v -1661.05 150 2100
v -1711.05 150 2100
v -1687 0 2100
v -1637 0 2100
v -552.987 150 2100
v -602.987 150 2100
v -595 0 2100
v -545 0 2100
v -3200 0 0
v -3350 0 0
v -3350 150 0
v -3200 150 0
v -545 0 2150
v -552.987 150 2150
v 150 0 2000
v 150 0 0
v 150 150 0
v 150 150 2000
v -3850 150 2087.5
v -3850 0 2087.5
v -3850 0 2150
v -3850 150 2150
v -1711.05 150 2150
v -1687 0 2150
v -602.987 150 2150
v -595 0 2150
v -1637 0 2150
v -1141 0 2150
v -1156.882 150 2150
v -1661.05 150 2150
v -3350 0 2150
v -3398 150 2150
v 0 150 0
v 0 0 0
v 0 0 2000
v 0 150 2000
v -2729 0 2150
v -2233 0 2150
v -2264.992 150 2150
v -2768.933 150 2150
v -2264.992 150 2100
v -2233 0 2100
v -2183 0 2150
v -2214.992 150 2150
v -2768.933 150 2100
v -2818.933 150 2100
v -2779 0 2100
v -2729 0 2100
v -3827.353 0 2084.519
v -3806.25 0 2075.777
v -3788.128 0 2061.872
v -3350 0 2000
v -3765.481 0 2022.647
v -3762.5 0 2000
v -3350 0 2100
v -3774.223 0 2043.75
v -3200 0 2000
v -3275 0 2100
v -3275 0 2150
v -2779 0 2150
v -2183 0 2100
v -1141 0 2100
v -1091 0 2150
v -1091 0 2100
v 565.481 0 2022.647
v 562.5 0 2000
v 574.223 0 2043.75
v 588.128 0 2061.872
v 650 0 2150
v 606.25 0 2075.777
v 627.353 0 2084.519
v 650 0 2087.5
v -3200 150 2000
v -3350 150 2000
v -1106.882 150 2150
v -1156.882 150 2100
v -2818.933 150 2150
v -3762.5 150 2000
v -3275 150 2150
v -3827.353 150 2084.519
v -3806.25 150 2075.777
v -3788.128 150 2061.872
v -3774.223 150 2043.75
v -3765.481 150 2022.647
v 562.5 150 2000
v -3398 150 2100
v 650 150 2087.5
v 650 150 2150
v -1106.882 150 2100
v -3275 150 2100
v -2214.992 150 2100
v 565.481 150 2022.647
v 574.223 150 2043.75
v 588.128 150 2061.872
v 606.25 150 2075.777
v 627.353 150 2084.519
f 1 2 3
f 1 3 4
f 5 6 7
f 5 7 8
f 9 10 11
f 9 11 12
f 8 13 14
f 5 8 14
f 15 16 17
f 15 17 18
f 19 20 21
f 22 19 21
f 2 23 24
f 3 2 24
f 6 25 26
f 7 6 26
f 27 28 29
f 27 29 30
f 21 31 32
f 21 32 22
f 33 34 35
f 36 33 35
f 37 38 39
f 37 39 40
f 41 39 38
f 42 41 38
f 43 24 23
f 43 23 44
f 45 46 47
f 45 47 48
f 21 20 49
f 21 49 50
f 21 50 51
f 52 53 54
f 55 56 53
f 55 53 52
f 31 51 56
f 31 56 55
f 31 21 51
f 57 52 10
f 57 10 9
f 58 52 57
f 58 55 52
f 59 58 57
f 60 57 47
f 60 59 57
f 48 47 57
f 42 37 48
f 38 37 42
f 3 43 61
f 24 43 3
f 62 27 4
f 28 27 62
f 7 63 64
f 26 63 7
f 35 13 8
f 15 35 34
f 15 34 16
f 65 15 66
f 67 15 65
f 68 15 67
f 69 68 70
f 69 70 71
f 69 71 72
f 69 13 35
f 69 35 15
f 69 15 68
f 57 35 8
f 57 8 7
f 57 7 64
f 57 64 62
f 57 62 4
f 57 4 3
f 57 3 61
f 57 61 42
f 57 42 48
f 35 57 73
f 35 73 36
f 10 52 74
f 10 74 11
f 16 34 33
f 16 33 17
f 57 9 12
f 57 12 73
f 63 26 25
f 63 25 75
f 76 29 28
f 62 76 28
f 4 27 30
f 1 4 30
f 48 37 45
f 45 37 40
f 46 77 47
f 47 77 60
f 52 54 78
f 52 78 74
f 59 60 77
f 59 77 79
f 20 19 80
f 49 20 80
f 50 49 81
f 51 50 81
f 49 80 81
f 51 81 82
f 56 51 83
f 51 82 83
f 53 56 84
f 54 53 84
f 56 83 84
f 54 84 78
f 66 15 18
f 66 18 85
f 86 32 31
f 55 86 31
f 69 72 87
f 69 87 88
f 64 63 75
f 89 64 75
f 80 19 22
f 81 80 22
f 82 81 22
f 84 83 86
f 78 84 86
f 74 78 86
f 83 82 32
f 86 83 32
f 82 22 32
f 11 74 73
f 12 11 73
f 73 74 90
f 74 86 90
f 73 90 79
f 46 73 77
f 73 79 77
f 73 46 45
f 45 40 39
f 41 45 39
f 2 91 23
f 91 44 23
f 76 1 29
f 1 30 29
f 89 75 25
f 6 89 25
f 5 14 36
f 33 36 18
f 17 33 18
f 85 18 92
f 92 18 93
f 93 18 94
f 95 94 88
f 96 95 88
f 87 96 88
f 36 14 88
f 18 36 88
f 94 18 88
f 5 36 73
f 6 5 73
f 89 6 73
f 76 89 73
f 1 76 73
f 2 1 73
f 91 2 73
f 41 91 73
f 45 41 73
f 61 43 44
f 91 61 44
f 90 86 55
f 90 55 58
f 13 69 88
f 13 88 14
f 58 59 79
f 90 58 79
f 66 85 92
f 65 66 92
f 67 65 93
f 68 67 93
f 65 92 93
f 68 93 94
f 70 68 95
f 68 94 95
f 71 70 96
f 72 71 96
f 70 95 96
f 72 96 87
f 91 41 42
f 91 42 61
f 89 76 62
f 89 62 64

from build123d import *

# Parameters (mm, degrees)
F0_W     = 150
F0_H     = 2000
F0_W_2   = 500
F0_H_2   = 150
F1_DEPTH = 150
F2_D     = 175
F3_D     = 175
F4_W     = 75
F4_H     = 150
F5_DEPTH = 50
F6_DEPTH = 50
F7_DEPTH = 50


with BuildPart() as f1:
    # F0 (on Front) → F1 (new body)
    with BuildSketch(Plane.XZ):
        with Locations((75, 1000)):
            Rectangle(F0_W, F0_H)
        Polygon((-3200, 2000), (0, 2000), (150, 2000), (150, 2150), (-3350, 2150), (-3350, 2000), align=None)
        with Locations((400, 2075)):
            Rectangle(F0_W_2, F0_H_2)
        with Locations((-3275, 1000)):
            Rectangle(F0_W, F0_H)
        with Locations((-3600, 2075)):
            Rectangle(F0_W_2, F0_H_2)
    extrude(amount=-F1_DEPTH)

    # F2 (through all)
    with Locations(Plane.XZ):
        with Locations((-3850, 2000)):
            Hole(F2_D / 2)

    # F3 (through all)
    with Locations(Plane.XZ):
        with Locations((650, 2000)):
            Hole(F3_D / 2)

    # F4 (on face) → F5 (cut)
    with BuildSketch(Plane.XY.offset(2150)):
        Polygon((-3398, 150), (-3350, 0), (-3350, 150), align=None)
        with Locations((-3312.5, 75)):
            Rectangle(F4_W, F4_H)
    extrude(amount=-F5_DEPTH, mode=Mode.SUBTRACT)

    # F4 (on face) → F6 (cut)
    with BuildSketch(Plane.XY.offset(2150)):
        Polygon((-2818.932719, 150), (-2779, 0), (-2729, 0), (-2768.932719, 150), align=None)
    extrude(amount=-F6_DEPTH, mode=Mode.SUBTRACT)

    # F4 (on face) → F7 (cut)
    with BuildSketch(Plane.XY.offset(2150)):
        Polygon((-602.986544, 150), (-595, 0), (-545, 0), (-552.986544, 150), align=None)
        Polygon((-1156.882332, 150), (-1141, 0), (-1091, 0), (-1106.882332, 150), align=None)
        Polygon((-1711.050388, 150), (-1687, 0), (-1637, 0), (-1661.050388, 150), align=None)
        Polygon((-2264.991554, 150), (-2233, 0), (-2183, 0), (-2214.991554, 150), align=None)
    extrude(amount=-F7_DEPTH, mode=Mode.SUBTRACT)


solid = f1.part
